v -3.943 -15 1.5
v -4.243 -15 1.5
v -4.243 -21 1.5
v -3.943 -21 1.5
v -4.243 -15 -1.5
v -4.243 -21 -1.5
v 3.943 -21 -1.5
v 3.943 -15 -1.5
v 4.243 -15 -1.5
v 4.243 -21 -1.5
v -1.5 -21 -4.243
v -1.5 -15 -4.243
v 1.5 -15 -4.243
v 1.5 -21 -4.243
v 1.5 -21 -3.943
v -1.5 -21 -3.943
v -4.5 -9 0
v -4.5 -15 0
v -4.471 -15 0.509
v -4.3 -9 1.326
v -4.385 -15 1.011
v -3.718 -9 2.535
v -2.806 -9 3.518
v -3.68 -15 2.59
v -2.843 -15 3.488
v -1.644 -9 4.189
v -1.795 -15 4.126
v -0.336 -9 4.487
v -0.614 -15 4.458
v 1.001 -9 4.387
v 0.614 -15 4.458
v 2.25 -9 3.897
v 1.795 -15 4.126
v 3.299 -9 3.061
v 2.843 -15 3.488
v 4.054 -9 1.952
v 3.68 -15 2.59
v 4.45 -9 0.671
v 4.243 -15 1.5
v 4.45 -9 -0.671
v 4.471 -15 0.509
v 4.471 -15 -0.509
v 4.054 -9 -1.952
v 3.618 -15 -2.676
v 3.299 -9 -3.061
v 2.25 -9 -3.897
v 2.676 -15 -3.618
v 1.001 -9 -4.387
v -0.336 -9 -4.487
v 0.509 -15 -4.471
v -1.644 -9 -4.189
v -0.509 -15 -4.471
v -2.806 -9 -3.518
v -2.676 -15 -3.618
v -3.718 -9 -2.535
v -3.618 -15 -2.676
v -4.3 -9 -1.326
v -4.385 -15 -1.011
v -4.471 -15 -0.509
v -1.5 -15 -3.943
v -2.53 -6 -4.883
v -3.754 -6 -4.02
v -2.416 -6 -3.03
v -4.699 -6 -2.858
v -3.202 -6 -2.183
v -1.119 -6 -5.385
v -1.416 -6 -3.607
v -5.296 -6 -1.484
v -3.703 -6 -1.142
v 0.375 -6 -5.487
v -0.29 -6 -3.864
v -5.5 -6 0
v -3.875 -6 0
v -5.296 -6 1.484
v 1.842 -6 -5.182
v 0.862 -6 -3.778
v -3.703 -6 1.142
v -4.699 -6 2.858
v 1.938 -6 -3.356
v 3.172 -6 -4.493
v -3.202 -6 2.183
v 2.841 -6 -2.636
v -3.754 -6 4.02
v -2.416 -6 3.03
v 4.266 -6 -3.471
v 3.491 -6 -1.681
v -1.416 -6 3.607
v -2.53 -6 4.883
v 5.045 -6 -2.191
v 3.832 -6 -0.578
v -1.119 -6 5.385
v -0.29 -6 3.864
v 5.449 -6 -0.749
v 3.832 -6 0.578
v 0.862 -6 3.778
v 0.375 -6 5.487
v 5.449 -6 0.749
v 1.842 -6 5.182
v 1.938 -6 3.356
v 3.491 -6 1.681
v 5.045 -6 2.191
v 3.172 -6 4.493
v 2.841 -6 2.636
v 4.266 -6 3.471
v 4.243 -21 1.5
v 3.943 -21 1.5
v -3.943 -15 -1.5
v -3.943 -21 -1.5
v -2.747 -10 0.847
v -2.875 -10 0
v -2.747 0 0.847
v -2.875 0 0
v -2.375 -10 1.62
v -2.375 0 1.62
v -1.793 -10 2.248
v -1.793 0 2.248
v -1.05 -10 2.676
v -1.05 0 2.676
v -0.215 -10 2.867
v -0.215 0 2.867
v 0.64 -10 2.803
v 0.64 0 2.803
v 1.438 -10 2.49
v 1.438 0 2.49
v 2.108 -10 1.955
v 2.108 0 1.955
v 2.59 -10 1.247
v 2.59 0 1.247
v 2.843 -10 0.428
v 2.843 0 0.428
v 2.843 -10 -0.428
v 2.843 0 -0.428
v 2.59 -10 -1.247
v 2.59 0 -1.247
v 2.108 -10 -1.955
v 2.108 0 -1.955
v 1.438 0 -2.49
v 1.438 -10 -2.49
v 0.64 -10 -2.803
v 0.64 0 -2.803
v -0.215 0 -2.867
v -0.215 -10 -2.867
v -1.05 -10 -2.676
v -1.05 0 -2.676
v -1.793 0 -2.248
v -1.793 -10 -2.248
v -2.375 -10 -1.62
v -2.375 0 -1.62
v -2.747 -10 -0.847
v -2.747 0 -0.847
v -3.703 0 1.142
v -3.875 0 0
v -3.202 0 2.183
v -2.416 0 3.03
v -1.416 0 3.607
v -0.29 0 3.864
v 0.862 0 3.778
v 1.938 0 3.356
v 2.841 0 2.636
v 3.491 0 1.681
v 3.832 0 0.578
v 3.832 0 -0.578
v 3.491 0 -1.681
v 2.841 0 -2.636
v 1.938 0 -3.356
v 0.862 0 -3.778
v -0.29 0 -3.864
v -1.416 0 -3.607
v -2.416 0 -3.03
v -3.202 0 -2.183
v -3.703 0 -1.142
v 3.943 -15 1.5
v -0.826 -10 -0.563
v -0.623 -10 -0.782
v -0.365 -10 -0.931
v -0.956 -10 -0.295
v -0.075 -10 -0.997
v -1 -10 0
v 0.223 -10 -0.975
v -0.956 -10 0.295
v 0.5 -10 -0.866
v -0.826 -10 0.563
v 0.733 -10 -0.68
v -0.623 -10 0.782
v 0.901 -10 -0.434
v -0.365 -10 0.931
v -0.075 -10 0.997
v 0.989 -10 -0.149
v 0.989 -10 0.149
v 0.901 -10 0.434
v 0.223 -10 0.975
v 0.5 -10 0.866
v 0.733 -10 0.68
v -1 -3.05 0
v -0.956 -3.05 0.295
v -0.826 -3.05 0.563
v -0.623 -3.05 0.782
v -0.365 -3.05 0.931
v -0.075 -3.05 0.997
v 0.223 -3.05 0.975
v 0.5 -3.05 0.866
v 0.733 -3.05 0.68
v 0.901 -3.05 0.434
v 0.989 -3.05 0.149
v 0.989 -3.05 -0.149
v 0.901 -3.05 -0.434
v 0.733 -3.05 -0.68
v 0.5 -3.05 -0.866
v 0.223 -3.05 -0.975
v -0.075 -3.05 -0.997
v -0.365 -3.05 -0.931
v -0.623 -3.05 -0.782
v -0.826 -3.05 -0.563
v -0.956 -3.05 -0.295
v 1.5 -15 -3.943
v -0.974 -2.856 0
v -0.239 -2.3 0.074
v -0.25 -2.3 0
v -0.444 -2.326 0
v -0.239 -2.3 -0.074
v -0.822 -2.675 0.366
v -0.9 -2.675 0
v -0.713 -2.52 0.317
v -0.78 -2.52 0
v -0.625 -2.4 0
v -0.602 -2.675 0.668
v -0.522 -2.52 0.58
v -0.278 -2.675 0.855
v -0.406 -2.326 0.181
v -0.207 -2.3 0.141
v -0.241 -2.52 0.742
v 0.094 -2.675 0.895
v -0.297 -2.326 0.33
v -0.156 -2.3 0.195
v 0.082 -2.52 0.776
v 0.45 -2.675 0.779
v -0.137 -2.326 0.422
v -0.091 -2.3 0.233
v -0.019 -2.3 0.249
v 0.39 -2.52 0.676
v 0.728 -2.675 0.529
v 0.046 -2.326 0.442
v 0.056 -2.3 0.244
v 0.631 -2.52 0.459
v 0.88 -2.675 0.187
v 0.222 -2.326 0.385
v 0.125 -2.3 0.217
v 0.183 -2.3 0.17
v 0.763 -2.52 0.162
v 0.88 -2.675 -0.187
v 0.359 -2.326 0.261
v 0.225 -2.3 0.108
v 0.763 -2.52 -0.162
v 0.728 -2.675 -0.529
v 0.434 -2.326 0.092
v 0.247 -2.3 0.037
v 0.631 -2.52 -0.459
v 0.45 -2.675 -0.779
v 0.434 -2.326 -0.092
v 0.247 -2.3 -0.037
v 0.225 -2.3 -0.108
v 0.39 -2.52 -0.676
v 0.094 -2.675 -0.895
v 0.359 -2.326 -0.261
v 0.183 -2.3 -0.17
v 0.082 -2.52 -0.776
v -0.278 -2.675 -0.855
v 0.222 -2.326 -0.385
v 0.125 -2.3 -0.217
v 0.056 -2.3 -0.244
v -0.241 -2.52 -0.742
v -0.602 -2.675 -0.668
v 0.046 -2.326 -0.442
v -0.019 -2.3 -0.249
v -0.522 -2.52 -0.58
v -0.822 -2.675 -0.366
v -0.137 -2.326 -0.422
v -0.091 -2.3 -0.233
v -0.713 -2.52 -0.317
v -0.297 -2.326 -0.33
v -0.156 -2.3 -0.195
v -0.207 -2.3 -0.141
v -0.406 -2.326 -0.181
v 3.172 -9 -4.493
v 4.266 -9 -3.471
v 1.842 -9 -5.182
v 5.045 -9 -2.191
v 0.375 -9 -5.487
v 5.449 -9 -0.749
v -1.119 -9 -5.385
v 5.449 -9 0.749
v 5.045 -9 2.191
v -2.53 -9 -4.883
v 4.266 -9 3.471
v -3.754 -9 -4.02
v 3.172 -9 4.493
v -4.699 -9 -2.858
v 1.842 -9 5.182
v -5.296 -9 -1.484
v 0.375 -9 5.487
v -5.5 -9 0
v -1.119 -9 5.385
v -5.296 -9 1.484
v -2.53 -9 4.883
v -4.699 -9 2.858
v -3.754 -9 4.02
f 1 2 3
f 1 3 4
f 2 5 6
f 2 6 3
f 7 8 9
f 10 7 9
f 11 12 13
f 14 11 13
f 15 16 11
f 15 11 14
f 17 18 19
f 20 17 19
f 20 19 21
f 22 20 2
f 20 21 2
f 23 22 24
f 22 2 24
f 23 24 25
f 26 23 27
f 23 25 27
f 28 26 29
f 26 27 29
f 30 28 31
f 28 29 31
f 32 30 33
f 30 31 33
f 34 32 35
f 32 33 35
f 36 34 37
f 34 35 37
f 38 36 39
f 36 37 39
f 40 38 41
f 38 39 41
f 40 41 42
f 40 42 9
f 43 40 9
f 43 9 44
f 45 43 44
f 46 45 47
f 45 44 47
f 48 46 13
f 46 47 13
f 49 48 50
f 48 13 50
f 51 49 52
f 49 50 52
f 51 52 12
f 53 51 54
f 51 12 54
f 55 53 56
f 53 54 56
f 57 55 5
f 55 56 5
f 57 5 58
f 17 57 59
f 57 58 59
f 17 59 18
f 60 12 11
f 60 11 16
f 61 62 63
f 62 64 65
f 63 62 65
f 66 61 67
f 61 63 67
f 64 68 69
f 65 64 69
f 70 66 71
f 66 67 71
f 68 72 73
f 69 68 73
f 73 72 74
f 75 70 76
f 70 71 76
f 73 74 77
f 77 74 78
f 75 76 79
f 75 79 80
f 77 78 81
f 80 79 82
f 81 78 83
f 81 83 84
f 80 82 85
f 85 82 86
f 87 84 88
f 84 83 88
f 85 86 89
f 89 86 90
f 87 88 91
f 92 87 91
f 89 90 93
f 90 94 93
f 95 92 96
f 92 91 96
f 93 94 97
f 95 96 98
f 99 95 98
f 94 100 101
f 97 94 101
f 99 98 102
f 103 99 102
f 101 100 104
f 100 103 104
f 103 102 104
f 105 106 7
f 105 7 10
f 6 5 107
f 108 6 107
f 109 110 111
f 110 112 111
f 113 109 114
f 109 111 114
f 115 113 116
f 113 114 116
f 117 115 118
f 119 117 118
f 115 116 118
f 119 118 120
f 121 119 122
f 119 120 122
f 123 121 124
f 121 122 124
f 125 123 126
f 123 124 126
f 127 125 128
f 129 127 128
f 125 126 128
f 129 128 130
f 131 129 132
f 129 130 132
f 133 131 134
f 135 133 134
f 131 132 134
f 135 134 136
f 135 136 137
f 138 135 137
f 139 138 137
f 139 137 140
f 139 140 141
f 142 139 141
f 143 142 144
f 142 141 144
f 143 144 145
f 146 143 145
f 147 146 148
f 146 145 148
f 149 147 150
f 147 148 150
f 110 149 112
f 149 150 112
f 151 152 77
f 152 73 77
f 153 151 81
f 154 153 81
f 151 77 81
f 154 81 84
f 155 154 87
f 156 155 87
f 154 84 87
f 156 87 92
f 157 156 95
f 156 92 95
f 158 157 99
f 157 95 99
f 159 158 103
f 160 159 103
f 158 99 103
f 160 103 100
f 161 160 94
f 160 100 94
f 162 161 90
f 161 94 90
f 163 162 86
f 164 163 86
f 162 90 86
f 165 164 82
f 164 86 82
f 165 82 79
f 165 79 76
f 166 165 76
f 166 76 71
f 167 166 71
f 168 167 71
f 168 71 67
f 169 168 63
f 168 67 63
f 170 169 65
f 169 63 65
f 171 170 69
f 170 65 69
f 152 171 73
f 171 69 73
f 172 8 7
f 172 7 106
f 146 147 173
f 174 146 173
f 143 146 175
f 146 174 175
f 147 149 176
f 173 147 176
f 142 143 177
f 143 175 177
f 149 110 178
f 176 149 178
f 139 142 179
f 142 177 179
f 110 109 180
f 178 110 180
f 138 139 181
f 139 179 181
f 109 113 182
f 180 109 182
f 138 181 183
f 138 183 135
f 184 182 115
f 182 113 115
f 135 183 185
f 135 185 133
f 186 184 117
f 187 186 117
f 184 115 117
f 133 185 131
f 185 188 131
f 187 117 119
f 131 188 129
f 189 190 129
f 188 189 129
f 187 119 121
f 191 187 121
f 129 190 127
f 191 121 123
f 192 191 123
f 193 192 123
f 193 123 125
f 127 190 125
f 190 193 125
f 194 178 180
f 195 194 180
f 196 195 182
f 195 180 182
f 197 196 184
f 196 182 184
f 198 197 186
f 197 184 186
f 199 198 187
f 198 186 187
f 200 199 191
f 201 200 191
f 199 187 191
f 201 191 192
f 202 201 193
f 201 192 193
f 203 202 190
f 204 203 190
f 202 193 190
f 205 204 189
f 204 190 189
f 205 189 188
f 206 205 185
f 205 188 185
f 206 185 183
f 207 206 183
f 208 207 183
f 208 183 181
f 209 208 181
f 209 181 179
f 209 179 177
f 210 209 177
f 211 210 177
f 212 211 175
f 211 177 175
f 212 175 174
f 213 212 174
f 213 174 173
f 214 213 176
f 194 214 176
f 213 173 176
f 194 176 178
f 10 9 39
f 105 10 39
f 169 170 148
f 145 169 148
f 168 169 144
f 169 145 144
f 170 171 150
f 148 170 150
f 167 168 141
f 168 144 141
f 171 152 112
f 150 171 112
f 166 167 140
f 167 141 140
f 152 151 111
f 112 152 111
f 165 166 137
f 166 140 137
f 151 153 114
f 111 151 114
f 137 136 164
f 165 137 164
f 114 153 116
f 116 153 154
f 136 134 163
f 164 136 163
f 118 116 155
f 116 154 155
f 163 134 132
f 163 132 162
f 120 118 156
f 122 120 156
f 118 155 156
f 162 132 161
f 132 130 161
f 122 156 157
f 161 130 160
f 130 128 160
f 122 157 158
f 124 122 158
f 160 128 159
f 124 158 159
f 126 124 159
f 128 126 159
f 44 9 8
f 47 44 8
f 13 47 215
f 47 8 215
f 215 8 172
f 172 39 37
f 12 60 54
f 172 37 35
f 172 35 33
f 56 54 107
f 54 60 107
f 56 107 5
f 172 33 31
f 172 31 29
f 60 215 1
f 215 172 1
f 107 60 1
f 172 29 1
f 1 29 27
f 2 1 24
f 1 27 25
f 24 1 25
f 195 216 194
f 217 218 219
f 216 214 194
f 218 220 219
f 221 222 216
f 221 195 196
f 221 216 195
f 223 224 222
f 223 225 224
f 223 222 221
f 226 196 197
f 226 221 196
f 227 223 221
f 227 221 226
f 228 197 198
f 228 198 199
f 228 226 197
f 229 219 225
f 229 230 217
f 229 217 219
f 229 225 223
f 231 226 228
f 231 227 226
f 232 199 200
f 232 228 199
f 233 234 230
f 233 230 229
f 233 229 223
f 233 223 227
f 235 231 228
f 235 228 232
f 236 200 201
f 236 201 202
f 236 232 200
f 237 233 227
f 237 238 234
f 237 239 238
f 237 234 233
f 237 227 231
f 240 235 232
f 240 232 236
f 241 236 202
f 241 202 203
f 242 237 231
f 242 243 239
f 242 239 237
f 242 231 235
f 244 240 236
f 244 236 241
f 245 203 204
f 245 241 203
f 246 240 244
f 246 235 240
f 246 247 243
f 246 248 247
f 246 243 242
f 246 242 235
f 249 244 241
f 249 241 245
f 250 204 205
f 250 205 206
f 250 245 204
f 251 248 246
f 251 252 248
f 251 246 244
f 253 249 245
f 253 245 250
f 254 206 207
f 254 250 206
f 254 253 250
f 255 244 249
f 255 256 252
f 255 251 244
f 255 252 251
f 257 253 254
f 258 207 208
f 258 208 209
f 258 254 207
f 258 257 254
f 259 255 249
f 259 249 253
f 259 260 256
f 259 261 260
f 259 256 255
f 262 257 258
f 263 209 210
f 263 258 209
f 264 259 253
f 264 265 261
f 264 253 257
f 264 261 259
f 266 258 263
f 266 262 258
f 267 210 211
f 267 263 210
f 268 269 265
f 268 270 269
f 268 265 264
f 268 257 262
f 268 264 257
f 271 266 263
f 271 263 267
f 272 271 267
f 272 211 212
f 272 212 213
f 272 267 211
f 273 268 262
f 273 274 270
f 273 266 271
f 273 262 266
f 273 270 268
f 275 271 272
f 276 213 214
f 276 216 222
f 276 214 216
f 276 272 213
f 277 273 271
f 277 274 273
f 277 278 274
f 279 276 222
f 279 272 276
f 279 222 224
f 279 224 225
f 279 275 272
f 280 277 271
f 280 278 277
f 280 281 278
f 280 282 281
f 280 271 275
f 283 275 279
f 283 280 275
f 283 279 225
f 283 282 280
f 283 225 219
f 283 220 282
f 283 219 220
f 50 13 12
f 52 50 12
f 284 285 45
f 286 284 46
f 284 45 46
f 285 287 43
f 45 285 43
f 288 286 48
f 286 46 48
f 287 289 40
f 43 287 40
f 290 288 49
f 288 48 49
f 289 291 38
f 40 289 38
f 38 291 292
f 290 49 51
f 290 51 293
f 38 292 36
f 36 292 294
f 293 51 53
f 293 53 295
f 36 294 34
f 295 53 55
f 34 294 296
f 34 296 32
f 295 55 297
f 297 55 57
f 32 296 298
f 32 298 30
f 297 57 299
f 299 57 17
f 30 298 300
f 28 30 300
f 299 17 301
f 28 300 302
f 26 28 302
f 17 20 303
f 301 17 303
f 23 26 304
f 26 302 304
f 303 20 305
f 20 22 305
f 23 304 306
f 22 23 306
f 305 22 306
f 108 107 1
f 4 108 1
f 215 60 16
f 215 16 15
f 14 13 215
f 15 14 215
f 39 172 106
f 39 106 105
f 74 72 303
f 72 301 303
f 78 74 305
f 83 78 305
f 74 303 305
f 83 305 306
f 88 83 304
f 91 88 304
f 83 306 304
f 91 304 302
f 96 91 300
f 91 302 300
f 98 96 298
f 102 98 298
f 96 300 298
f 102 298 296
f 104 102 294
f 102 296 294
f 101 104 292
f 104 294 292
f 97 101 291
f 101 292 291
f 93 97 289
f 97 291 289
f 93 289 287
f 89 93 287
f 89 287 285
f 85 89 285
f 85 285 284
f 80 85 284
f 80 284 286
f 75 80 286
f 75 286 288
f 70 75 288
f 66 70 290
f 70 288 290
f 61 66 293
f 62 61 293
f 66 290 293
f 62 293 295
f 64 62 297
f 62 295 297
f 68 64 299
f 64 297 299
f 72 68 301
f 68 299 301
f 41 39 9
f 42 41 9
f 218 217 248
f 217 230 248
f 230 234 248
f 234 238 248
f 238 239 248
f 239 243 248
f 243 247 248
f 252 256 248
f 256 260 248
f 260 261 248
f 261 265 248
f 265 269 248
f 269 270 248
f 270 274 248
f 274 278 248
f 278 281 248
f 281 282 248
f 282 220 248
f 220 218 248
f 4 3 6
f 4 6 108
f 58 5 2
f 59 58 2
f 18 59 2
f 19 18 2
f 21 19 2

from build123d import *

# Parameters (mm, degrees)
SKIZZE2_W                       = 0.3
SKIZZE2_H                       = 3
SKIZZE2_W_2                     = 3
SKIZZE2_H_2                     = 0.3
AUFSATZ_LINEAR_AUSTRAGEN1_DEPTH = 6
VERRUNDUNG1_R                   = 0.75


with BuildPart() as part:
    # Skizze1 → Rotation1 (revolve)
    with BuildSketch(Plane.XY):
        Polygon((-3.875, 0), (-3.875, -6), (-5.5, -6), (-5.5, -9), (-4.5, -9), (-4.5, -15), (0, -15), (0, -2.3), (-1, -2.3), (-1, -10), (-2.875, -10), (-2.875, 0), align=None)
    revolve(axis=Axis((0, -15, 0), (0, 1, 0)))

    # Skizze2 → Aufsatz-Linear austragen1 (add)
    with BuildSketch(Plane.XZ.offset(15)):
        with Locations((-4.092640687, 0)):
            Rectangle(SKIZZE2_W, SKIZZE2_H)
        with Locations((4.092640687, 0)):
            Rectangle(SKIZZE2_W, SKIZZE2_H)
        with Locations((0, -4.092640687)):
            Rectangle(SKIZZE2_W_2, SKIZZE2_H_2)
    extrude(amount=AUFSATZ_LINEAR_AUSTRAGEN1_DEPTH)

    # Verrundung1
    verrundung1_edges = [part.edges().sort_by_distance(p)[0] for p in [
        (1, -2.3, 0),
    ]]
    fillet(verrundung1_edges, radius=VERRUNDUNG1_R)


solid = part.part
